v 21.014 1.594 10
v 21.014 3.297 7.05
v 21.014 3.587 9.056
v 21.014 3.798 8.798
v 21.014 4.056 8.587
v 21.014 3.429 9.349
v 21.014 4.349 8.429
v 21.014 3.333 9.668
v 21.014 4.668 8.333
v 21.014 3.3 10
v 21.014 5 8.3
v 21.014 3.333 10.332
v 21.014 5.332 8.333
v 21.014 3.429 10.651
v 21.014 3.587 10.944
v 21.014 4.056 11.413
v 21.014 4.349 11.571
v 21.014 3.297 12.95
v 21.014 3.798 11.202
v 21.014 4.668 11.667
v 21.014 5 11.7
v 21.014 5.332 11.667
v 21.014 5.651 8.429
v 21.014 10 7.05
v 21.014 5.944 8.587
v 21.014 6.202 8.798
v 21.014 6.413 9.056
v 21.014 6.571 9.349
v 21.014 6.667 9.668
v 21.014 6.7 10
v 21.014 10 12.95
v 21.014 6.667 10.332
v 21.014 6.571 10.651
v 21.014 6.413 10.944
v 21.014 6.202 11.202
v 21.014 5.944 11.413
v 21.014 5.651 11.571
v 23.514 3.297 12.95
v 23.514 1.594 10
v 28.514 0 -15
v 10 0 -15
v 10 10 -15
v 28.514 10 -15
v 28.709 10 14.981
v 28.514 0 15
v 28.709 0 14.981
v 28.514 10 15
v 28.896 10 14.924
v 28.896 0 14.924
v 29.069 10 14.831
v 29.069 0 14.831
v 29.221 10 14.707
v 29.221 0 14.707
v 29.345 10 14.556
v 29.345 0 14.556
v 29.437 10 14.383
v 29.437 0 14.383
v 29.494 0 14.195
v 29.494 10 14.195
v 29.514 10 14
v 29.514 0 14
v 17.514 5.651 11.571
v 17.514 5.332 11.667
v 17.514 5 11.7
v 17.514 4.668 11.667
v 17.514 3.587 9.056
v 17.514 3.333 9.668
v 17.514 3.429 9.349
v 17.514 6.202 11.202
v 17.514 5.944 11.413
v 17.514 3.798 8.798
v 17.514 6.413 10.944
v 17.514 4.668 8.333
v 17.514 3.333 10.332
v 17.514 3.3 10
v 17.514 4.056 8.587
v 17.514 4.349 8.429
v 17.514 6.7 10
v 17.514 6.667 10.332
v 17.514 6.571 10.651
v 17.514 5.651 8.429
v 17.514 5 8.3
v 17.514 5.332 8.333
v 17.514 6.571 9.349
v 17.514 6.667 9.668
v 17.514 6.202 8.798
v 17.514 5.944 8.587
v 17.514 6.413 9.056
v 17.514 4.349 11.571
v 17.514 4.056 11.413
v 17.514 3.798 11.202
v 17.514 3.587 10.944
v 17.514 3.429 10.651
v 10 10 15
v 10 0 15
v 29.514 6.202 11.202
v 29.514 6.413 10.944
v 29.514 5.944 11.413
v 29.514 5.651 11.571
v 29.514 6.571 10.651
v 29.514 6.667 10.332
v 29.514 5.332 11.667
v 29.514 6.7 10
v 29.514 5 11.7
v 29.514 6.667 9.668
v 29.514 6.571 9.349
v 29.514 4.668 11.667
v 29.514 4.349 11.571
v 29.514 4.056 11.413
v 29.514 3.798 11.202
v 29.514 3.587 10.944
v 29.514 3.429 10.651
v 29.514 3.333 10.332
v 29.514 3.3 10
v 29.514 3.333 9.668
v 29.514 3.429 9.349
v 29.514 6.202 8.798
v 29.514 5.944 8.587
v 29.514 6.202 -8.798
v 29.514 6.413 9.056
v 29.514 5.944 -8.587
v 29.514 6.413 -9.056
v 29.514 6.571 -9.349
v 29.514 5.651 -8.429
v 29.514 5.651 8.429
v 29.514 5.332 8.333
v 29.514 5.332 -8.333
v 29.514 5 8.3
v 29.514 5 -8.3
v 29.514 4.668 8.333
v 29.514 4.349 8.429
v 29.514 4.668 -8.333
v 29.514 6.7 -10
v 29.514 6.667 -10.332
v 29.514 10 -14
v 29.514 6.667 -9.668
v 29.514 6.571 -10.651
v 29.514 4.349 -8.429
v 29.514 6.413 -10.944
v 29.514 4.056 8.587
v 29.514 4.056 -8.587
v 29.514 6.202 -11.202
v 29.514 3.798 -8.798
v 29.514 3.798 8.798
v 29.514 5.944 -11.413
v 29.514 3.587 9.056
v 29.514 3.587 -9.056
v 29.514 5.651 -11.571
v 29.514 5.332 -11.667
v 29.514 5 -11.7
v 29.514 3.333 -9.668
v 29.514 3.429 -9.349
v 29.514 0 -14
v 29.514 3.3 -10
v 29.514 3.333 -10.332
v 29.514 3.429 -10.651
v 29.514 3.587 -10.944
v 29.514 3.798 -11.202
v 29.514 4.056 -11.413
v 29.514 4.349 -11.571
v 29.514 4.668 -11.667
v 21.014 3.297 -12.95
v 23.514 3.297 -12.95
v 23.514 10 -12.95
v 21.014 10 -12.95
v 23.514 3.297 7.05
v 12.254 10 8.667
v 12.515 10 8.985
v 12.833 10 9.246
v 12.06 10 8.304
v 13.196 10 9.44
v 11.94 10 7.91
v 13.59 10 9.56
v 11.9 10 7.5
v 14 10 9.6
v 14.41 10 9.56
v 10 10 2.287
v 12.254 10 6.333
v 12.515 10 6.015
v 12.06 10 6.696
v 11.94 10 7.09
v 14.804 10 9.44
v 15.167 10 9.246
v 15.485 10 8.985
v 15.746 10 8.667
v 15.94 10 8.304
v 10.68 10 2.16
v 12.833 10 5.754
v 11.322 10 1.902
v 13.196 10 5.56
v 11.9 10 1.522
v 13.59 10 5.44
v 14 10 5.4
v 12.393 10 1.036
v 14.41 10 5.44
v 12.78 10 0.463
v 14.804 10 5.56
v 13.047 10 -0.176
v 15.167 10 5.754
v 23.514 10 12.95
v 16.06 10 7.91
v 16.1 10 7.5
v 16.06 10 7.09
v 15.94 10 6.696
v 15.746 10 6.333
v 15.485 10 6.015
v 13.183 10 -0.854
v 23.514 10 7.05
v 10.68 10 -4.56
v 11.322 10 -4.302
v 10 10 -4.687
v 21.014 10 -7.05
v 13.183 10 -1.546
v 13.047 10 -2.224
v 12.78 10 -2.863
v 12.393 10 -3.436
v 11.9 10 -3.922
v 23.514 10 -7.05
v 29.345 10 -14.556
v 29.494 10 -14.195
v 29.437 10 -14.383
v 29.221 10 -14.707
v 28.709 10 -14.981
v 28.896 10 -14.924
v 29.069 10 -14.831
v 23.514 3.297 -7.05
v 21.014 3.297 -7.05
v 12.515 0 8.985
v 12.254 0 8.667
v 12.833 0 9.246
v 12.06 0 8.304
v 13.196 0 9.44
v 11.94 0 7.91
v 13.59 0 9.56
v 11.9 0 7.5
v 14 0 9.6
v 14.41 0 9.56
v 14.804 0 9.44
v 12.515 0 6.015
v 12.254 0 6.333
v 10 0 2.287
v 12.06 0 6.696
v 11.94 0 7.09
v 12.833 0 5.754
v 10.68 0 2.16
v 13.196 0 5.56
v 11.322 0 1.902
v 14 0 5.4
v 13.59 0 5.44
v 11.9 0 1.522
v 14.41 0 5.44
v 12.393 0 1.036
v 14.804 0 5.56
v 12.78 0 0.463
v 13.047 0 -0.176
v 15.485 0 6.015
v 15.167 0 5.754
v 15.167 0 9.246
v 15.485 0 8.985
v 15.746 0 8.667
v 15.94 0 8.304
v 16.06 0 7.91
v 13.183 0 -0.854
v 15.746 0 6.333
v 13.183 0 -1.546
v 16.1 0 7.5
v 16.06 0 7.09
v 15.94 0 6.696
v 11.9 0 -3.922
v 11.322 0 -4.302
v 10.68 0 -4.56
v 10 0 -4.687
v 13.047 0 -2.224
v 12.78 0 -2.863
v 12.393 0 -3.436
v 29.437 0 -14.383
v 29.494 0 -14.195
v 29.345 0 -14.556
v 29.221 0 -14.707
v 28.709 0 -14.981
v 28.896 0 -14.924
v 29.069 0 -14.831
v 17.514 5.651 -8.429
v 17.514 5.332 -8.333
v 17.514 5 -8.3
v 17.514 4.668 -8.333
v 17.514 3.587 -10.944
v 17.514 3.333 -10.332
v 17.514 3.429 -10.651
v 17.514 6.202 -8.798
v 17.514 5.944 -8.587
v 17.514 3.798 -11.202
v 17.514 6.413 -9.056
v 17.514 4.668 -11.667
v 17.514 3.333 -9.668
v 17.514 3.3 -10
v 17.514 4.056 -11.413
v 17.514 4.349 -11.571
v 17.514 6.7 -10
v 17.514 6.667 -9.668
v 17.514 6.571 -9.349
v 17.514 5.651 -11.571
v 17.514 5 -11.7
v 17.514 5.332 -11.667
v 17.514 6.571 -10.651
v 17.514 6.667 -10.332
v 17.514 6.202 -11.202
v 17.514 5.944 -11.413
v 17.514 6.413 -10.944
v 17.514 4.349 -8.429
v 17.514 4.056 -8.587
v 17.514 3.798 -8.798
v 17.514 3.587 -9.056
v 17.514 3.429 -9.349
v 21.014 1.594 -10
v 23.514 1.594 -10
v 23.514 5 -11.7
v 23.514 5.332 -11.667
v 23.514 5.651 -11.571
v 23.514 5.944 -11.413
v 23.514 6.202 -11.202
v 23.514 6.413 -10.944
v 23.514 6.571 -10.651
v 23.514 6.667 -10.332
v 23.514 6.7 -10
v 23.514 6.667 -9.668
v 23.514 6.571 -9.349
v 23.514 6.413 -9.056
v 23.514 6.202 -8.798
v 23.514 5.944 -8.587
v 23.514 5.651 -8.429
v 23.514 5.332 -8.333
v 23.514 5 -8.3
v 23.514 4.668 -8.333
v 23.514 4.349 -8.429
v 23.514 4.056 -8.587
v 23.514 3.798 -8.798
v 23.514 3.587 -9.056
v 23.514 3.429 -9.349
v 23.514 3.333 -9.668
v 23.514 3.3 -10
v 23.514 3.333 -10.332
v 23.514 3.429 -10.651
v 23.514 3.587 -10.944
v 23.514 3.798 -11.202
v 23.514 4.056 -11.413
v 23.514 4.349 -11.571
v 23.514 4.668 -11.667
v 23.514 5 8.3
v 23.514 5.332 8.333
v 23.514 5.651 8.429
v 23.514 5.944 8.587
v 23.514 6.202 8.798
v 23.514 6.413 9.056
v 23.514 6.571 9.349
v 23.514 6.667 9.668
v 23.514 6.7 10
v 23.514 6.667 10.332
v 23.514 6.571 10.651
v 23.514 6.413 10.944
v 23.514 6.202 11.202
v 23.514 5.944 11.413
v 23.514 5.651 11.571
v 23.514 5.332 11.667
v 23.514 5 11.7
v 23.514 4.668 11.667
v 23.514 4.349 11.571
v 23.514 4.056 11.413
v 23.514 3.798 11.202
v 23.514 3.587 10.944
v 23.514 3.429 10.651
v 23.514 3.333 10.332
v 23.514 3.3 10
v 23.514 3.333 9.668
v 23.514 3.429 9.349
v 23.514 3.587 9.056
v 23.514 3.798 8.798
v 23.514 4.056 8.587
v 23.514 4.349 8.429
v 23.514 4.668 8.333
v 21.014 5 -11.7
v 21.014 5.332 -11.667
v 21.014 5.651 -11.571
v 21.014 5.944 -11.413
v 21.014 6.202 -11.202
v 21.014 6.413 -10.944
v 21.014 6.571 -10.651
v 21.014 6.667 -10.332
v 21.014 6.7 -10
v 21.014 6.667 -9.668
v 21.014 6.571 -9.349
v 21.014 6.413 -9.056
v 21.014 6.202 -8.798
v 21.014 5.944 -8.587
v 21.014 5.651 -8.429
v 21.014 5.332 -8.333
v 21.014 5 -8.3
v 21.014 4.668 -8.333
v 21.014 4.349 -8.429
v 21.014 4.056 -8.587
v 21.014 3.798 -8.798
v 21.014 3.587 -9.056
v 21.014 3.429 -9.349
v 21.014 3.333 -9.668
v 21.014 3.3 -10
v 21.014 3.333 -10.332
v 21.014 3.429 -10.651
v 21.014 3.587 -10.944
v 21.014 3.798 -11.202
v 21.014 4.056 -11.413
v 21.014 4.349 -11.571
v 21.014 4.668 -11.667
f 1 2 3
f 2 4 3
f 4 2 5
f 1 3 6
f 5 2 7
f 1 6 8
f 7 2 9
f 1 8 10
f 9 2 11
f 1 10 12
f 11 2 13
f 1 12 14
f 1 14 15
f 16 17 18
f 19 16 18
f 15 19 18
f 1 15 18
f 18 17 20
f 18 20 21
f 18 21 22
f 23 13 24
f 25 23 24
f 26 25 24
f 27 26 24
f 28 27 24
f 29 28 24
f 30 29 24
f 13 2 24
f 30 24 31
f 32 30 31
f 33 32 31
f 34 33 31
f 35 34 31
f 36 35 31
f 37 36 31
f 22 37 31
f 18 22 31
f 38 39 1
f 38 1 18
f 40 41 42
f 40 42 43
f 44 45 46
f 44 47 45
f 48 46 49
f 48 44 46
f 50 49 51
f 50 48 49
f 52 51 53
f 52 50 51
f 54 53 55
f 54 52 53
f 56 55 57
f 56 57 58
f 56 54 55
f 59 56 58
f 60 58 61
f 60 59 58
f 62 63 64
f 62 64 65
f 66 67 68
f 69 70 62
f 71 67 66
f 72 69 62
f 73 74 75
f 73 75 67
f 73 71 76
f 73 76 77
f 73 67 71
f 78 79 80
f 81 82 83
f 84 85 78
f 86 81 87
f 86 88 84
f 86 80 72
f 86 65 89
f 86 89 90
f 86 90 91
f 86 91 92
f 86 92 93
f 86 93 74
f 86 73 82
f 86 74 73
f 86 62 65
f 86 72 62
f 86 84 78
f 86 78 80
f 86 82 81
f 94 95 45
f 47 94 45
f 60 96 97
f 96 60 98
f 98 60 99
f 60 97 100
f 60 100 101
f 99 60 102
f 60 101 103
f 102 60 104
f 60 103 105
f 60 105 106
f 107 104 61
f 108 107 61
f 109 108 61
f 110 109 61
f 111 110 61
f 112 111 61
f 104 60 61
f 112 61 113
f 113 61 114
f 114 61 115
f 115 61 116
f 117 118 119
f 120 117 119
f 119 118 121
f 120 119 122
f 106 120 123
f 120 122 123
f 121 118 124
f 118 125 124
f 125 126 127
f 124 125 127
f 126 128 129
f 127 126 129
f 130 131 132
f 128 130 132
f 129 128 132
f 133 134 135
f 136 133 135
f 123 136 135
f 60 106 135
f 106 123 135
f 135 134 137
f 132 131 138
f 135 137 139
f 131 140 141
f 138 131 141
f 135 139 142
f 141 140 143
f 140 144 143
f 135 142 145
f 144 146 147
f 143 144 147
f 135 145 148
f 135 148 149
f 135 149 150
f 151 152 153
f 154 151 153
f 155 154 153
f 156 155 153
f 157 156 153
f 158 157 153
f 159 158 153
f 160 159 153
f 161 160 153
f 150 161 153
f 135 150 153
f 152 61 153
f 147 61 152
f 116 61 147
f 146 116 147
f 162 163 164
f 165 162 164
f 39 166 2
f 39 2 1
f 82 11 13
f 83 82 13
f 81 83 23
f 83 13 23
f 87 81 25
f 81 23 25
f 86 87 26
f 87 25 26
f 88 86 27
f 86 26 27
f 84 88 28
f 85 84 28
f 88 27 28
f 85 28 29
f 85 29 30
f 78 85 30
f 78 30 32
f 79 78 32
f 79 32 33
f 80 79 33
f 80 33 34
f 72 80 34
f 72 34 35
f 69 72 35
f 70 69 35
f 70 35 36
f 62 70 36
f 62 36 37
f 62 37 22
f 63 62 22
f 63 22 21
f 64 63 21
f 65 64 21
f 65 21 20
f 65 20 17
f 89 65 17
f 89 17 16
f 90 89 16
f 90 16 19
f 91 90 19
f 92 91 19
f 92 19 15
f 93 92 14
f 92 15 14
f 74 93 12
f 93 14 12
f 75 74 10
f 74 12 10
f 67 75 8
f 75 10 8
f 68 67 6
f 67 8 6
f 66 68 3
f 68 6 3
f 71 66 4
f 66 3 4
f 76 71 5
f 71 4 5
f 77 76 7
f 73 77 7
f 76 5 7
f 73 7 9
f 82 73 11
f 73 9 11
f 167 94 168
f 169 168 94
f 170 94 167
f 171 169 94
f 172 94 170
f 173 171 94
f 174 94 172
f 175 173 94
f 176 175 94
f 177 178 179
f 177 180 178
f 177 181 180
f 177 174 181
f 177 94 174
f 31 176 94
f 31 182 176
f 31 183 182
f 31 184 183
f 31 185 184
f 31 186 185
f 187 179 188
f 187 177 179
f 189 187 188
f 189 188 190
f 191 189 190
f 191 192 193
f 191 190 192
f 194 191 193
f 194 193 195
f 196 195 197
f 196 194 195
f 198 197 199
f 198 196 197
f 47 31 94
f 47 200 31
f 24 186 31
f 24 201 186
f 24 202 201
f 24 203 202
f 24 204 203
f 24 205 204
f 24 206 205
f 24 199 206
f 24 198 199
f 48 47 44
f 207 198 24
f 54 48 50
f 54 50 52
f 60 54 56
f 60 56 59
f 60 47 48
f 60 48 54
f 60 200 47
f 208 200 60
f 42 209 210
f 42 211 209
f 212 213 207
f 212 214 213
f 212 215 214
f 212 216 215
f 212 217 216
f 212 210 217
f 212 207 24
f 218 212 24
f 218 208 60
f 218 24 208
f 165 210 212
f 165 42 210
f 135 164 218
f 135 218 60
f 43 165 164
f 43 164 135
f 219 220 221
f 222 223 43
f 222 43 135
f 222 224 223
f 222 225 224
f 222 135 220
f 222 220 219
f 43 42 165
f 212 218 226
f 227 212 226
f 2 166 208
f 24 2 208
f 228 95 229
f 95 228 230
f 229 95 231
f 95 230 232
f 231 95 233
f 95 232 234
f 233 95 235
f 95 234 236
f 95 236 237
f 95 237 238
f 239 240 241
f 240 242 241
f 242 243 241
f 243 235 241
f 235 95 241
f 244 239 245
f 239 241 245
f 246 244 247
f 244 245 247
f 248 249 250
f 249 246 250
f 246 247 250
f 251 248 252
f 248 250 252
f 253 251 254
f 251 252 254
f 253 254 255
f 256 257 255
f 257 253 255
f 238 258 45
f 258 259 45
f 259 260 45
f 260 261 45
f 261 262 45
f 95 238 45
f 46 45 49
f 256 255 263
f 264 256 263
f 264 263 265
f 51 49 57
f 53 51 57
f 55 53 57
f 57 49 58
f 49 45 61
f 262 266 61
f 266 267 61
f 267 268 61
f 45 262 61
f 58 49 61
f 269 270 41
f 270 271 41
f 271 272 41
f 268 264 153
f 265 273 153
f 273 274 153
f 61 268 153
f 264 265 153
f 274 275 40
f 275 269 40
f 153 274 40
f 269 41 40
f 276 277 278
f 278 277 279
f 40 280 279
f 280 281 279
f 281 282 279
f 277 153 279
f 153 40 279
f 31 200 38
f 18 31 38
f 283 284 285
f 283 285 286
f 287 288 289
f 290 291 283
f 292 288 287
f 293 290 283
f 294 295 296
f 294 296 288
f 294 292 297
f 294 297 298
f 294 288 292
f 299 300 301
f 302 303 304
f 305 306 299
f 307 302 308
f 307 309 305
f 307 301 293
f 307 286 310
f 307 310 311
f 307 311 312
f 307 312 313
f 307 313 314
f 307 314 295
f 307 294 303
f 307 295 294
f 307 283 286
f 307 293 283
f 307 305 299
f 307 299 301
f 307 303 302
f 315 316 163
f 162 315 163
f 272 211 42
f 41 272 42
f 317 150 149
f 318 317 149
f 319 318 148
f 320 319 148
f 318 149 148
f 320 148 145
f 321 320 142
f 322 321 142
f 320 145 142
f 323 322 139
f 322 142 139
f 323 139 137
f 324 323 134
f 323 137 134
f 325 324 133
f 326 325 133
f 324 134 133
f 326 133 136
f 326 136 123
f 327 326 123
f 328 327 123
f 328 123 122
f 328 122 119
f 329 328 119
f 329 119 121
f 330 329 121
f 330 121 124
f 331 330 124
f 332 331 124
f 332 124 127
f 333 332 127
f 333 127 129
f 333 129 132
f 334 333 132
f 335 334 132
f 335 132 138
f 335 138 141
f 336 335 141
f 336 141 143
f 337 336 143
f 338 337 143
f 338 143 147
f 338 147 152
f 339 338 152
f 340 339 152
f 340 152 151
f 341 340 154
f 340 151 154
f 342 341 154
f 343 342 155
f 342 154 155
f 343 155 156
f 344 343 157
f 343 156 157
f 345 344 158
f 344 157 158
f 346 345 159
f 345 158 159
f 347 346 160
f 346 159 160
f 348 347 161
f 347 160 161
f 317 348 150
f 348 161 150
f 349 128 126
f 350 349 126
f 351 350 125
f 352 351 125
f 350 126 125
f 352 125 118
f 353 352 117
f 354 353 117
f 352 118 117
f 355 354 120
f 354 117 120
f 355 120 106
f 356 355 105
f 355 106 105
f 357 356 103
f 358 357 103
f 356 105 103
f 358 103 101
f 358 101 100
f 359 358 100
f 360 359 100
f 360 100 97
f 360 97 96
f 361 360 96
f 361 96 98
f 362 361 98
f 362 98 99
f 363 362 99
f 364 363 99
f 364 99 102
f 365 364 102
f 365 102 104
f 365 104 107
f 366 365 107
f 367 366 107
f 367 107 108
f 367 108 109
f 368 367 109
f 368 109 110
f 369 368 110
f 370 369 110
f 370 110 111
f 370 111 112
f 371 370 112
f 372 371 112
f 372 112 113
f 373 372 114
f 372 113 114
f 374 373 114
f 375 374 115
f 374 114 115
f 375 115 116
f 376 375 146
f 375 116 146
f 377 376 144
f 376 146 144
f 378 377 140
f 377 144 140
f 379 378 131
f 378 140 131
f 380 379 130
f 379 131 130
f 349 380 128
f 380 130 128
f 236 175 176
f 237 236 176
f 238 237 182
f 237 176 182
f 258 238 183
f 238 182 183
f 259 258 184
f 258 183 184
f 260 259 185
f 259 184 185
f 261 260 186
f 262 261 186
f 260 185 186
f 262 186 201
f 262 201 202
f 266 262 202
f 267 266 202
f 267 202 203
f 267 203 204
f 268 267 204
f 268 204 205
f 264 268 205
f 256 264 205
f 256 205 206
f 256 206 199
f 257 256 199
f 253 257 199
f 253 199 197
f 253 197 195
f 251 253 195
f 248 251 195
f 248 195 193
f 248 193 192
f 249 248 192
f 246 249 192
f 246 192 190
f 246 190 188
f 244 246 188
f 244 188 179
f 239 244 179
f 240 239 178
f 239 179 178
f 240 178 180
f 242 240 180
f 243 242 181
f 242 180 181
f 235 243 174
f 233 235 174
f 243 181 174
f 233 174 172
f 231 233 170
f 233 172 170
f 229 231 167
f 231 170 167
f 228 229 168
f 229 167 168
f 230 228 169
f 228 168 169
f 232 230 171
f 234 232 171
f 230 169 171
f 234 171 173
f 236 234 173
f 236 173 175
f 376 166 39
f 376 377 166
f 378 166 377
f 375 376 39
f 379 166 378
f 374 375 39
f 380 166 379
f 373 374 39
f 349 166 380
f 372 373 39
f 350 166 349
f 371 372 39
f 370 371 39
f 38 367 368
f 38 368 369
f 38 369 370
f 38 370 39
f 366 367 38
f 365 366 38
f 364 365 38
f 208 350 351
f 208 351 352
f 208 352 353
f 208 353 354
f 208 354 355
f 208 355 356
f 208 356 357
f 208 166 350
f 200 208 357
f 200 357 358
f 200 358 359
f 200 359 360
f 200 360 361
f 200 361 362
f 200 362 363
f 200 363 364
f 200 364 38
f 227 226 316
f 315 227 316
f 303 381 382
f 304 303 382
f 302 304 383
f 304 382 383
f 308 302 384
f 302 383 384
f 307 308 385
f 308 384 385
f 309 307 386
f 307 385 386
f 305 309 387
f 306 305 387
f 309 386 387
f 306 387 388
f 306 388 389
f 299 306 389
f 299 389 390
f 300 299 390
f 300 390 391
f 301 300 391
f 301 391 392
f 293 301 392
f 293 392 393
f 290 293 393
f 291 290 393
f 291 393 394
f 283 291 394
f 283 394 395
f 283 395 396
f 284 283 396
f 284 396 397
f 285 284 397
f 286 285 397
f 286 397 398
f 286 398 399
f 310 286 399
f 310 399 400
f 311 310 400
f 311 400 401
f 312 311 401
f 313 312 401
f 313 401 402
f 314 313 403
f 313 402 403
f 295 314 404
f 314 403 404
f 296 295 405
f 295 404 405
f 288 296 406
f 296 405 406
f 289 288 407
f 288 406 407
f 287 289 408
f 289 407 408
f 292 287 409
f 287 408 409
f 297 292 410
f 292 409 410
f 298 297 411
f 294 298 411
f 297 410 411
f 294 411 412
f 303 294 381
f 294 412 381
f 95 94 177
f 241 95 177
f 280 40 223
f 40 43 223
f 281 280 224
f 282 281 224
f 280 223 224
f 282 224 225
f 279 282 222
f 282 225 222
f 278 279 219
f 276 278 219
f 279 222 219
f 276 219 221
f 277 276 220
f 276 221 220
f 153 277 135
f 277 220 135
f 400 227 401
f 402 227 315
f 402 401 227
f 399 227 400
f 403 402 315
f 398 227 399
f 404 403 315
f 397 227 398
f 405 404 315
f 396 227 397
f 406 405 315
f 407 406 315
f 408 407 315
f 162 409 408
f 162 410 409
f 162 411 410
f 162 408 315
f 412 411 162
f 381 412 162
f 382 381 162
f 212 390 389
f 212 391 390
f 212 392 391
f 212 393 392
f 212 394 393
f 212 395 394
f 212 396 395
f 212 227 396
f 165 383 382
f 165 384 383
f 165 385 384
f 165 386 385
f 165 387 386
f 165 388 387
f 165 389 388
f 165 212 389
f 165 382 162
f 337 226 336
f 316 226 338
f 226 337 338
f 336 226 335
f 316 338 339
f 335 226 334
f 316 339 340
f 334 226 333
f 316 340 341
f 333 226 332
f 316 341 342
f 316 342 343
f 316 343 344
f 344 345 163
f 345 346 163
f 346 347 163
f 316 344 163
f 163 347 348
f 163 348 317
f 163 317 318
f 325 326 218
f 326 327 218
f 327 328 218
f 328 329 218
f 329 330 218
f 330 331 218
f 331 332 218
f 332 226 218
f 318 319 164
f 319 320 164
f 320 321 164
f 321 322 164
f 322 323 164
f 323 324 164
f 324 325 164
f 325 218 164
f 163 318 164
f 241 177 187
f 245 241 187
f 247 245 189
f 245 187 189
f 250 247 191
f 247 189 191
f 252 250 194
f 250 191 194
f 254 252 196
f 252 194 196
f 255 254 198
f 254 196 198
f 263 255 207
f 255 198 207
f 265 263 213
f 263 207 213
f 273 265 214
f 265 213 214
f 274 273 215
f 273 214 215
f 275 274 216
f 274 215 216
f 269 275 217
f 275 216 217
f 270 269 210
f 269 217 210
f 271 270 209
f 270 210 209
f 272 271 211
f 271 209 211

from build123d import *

# Parameters (mm, degrees)
SKETCH1_W           = 59.0272
SKETCH1_H           = 30
BOSS_EXTRUDE1_DEPTH = 10
SKETCH2_R           = 2.1
CUT_EXTRUDE1_DEPTH  = 35.58399319
SKETCH3_R           = 1.7
CUT_EXTRUDE2_DEPTH  = 12
SKETCH4_R           = 1.65
CUT_EXTRUDE3_DEPTH  = 12
CUT_EXTRUDE4_DEPTH  = 2.5
CUT_EXTRUDE5_DEPTH  = 2.3
SKETCH7_R           = 3.5
CUT_EXTRUDE6_DEPTH  = 35.58399319
FILLET1_R           = 1
SKETCH8_W           = 39.5136
SKETCH8_H           = 30
CUT_EXTRUDE7_DEPTH  = 35.58399319


with BuildPart() as part:
    # Sketch1 → Boss-Extrude1 (new body)
    with BuildSketch(Plane(origin=(0, 0, 0), x_dir=(1, 0, 0), z_dir=(0, 1, 0))):
        Rectangle(SKETCH1_W, SKETCH1_H)
    extrude(amount=BOSS_EXTRUDE1_DEPTH)

    # Sketch2 → Cut-Extrude1 (cut, through all)
    with BuildSketch(Plane(origin=(0, 10, 0), x_dir=(1, 0, 0), z_dir=(0, 1, 0))):
        with Locations(Location((-6, -7.5, 0), (0, 0, 270))):
            Circle(SKETCH2_R)
        with Locations(Location((14, -7.5, 0), (0, 0, 270))):
            Circle(SKETCH2_R)
    extrude(amount=-CUT_EXTRUDE1_DEPTH, mode=Mode.SUBTRACT)

    # Sketch3 → Cut-Extrude2 (cut)
    with BuildSketch(Plane(origin=(29.5136, 0, 0), x_dir=(0, 0, -1), z_dir=(1, 0, 0))):
        with Locations((-10, 5)):
            Circle(SKETCH3_R)
        with Locations((10, 5)):
            Circle(SKETCH3_R)
    extrude(amount=-CUT_EXTRUDE2_DEPTH, mode=Mode.SUBTRACT)

    # Sketch4 → Cut-Extrude3 (cut)
    with BuildSketch(Plane.ZY.offset(29.5136)):
        with Locations((-10, 5)):
            Circle(SKETCH4_R)
        with Locations((10, 5)):
            Circle(SKETCH4_R)
    extrude(amount=-CUT_EXTRUDE3_DEPTH, mode=Mode.SUBTRACT)

    # Sketch5 → Cut-Extrude4 (cut)
    with BuildSketch(Plane(origin=(23.5136, 0, 0), x_dir=(0, 0, -1), z_dir=(1, 0, 0))):
        Polygon((-12.95, 6.703183294), (-12.95, 10), (-7.05, 10), (-7.05, 6.703183294), (-7.05, 3.296816706), (-10, 1.593633412), (-12.95, 3.296816706), align=None)
        Polygon((7.05, 6.703183294), (7.05, 3.296816706), (10, 1.593633412), (12.95, 3.296816706), (12.95, 6.703183294), (12.95, 10), (7.05, 10), align=None)
    extrude(amount=-CUT_EXTRUDE4_DEPTH, mode=Mode.SUBTRACT)

    # Sketch6 → Cut-Extrude5 (cut)
    with BuildSketch(Plane.ZY.offset(23.5136)):
        Polygon((-12.85, 6.645448267), (-12.85, 10), (-7.15, 10), (-7.15, 6.645448267), (-7.15, 3.354551733), (-10, 1.709103466), (-12.85, 3.354551733), align=None)
        Polygon((7.15, 6.645448267), (7.15, 3.354551733), (10, 1.709103466), (12.85, 3.354551733), (12.85, 6.645448267), (12.85, 10), (7.15, 10), align=None)
    extrude(amount=-CUT_EXTRUDE5_DEPTH, mode=Mode.SUBTRACT)

    # Sketch7 → Cut-Extrude6 (cut, through all)
    with BuildSketch(Plane(origin=(0, 10, 0), x_dir=(1, 0, 0), z_dir=(0, 1, 0))):
        with Locations(Location((9.7, 1.2, 0), (0, 0, 270))):
            Circle(SKETCH7_R)
        with Locations(Location((-15.7, 1.2, 0), (0, 0, 270))):
            Circle(SKETCH7_R)
    extrude(amount=-CUT_EXTRUDE6_DEPTH, mode=Mode.SUBTRACT)

    # Fillet1
    fillet1_edges = [part.edges().sort_by_distance(p)[0] for p in [
        (29.5136, 5, 15),
        (-29.5136, 5, 15),
        (-29.5136, 5, -15),
        (29.5136, 5, -15),
    ]]
    fillet(fillet1_edges, radius=FILLET1_R)

    # Sketch8 → Cut-Extrude7 (cut, through all)
    with BuildSketch(Plane(origin=(0, 10, 0), x_dir=(1, 0, 0), z_dir=(0, 1, 0))):
        with Locations((-9.7568, 0)):
            Rectangle(SKETCH8_W, SKETCH8_H)
    extrude(amount=-CUT_EXTRUDE7_DEPTH, mode=Mode.SUBTRACT)


solid = part.part
